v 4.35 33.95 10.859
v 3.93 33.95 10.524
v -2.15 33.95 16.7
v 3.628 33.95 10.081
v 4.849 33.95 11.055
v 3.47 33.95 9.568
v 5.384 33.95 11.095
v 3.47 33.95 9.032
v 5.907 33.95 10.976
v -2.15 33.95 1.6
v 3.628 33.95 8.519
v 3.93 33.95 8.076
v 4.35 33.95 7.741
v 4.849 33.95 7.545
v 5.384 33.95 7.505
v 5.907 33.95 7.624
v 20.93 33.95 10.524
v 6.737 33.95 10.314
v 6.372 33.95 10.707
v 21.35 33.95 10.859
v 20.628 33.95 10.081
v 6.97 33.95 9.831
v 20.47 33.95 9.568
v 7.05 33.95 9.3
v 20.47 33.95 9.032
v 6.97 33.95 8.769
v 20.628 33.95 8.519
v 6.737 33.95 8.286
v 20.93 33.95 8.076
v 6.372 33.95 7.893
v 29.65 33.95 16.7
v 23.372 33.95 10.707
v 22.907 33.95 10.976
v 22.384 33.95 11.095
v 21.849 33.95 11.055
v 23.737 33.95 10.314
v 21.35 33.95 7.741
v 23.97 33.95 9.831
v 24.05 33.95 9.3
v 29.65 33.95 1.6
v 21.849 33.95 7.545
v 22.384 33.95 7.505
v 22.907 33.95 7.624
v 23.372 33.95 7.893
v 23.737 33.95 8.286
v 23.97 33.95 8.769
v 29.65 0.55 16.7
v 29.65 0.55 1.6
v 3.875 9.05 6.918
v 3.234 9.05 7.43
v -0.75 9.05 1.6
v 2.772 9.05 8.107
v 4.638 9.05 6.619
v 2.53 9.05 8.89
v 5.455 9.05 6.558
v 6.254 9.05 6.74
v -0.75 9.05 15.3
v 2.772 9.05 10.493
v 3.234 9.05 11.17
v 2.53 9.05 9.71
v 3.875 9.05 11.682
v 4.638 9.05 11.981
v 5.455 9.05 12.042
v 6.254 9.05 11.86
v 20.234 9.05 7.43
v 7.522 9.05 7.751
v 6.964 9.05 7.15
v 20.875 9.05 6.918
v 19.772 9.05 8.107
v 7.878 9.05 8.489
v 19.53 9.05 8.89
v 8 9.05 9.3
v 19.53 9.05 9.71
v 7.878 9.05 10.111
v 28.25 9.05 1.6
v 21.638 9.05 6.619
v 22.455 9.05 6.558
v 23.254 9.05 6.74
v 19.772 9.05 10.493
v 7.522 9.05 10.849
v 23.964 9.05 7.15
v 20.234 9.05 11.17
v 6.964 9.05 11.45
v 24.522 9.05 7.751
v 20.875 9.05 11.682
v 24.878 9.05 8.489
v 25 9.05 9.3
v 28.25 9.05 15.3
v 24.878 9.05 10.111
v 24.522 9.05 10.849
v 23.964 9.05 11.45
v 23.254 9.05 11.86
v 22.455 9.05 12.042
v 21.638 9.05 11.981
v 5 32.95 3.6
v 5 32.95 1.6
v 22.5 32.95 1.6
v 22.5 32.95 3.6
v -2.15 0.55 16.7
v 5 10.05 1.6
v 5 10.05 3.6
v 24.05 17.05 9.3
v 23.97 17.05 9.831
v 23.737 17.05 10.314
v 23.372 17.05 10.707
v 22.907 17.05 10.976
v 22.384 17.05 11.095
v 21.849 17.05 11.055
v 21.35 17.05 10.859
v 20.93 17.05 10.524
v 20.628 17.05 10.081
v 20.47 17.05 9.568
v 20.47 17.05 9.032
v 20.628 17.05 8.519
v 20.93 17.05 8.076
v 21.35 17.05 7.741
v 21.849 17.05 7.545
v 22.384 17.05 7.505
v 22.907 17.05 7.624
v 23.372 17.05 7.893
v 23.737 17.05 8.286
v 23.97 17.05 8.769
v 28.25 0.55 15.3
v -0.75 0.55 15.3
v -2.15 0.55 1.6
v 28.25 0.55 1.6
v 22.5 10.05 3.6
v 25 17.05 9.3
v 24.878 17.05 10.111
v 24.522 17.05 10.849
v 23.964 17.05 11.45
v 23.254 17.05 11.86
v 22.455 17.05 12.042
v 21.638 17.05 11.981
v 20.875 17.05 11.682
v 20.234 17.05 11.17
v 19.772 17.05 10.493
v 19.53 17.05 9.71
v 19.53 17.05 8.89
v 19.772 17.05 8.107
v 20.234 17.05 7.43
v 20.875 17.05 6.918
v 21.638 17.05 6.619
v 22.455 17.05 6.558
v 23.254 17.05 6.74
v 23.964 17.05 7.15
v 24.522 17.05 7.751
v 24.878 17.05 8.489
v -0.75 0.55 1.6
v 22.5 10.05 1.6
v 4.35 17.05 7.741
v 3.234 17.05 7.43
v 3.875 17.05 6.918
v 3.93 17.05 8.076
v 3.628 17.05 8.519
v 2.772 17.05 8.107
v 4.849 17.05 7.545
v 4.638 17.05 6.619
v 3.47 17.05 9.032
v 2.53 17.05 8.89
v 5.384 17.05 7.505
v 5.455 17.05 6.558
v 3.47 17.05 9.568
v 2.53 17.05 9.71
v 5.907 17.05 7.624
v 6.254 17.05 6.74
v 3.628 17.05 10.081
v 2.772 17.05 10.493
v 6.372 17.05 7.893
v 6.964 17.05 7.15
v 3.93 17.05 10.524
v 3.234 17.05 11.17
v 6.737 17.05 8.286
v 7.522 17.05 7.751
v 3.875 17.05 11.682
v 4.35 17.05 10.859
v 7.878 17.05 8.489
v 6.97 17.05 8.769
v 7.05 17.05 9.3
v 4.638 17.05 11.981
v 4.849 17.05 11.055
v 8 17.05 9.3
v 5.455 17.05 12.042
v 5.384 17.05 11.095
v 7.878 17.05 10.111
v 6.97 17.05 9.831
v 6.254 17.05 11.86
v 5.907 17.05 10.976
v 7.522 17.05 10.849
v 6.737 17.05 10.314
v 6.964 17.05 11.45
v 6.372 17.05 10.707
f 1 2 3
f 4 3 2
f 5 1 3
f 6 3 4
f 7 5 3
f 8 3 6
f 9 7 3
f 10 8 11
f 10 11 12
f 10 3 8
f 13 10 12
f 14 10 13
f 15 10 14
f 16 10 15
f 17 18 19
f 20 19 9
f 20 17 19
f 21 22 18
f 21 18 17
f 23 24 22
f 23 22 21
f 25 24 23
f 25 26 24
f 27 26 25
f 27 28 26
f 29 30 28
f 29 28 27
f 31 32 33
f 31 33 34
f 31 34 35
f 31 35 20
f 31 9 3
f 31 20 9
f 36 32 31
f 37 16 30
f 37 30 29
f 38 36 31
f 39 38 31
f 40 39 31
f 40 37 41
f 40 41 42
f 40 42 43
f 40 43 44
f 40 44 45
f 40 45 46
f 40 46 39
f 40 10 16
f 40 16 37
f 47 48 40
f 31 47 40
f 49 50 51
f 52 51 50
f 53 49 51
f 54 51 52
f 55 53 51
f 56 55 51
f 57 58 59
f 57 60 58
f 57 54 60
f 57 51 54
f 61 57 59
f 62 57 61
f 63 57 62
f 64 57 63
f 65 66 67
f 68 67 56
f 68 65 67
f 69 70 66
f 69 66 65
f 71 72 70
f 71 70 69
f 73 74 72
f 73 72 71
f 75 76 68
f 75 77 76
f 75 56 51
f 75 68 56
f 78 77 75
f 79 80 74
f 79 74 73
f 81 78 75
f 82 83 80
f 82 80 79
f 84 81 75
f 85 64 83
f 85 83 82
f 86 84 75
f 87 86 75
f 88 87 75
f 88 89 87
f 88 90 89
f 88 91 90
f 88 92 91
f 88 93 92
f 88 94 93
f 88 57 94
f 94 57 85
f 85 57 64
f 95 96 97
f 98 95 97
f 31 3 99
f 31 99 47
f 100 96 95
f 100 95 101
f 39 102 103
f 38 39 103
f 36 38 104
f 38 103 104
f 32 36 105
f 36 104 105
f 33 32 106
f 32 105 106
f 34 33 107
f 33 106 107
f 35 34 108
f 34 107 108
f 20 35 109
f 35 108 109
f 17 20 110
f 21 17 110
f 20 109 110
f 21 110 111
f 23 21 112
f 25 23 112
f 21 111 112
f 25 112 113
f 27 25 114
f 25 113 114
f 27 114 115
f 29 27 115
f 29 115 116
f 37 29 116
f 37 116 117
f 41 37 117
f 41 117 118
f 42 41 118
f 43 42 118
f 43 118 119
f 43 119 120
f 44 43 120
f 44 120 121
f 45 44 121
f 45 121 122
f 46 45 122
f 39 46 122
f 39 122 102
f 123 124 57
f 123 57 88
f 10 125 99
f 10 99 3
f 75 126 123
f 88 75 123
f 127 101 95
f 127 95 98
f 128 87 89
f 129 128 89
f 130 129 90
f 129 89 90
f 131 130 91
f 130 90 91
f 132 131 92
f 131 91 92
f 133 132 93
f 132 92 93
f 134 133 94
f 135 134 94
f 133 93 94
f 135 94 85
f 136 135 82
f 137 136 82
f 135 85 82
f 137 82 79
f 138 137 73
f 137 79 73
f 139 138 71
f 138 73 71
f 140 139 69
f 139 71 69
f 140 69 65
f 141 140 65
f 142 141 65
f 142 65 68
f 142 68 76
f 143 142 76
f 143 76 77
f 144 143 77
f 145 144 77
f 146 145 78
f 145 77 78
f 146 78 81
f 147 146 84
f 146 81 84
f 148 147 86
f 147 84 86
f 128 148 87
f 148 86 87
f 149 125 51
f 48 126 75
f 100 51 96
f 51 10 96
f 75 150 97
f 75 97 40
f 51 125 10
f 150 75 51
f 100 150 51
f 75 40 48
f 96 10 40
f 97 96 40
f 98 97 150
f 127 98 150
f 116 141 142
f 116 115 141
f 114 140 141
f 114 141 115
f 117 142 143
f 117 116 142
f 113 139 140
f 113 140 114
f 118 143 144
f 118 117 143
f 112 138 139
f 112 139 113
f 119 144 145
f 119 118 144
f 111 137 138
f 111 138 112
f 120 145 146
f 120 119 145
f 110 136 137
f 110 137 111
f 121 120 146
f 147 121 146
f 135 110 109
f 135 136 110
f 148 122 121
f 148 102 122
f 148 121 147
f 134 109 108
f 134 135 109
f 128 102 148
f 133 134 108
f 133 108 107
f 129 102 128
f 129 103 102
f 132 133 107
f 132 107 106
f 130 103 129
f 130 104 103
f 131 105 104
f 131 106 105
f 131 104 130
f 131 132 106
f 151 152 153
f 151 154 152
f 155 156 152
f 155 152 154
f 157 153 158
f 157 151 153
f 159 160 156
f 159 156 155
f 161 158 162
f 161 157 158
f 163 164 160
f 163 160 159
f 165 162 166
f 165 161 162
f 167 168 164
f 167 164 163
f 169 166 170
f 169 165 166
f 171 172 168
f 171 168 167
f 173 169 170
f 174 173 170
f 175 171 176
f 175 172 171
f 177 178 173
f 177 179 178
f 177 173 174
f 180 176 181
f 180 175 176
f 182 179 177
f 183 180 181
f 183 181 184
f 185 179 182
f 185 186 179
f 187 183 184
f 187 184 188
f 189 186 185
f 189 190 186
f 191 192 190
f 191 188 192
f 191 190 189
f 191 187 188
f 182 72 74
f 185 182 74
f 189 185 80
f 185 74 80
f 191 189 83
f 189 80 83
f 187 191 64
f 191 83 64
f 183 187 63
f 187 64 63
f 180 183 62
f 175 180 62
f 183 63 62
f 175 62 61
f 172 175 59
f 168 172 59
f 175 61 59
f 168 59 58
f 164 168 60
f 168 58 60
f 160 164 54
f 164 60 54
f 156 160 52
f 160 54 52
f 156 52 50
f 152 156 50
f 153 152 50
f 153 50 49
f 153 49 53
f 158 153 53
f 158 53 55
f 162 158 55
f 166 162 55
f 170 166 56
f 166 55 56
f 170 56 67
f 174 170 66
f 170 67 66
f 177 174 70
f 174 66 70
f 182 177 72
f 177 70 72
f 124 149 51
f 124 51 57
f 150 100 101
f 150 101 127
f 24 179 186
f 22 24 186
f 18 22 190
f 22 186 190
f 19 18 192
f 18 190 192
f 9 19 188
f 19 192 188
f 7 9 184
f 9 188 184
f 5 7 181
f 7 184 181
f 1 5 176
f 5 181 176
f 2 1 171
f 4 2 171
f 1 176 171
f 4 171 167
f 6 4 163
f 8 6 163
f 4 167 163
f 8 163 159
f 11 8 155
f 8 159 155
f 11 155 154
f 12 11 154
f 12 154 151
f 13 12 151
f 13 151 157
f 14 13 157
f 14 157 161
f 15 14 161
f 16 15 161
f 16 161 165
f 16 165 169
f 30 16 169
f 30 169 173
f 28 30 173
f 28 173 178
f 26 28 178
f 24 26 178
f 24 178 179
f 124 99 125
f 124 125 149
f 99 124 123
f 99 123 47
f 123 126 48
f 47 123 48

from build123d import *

# Parameters (mm, degrees)
SKETCH004_W     = 31.8
SKETCH004_H     = 33.4
PAD002_DEPTH    = 15.1
SKETCH005_W     = 29.000001
SKETCH005_H     = 13.7
POCKET001_DEPTH = 8.5
SKETCH006_W     = 17.5
SKETCH006_H     = 22.9
POCKET002_DEPTH = 2
SKETCH009_R     = 2.75
POCKET004_DEPTH = 8
SKETCH010_R     = 1.8
POCKET005_DEPTH = 20


with BuildPart() as part:
    # Sketch004 (on Face5 of Binder001) → Pad002 (new body)
    with BuildSketch(Plane.XY.offset(1.6)):
        with Locations((13.749781, 17.25)):
            Rectangle(SKETCH004_W, SKETCH004_H)
    extrude(amount=PAD002_DEPTH)

    # Sketch005 (on Face2 of Pad002) → Pocket001 (cut)
    with BuildSketch(Plane.XZ.offset(-0.55)):
        with Locations((13.74978, 8.45)):
            Rectangle(SKETCH005_W, SKETCH005_H)
    extrude(amount=-POCKET001_DEPTH, mode=Mode.SUBTRACT)

    # Sketch006 (on Face4 of Pocket001) → Pocket002 (cut)
    with BuildSketch(Plane(origin=(0, 0, 1.6), x_dir=(1, 0, 0), z_dir=(0, 0, -1))):
        with Locations((13.75, -21.5)):
            Rectangle(SKETCH006_W, SKETCH006_H)
    extrude(amount=-POCKET002_DEPTH, mode=Mode.SUBTRACT)

    # Sketch009 (on Face10 of Pocket002) → Pocket004 (cut)
    with BuildSketch(Plane.XZ.offset(-9.05)):
        with Locations((5.24978, 9.3)):
            Circle(SKETCH009_R)
        with Locations((22.249781, 9.3)):
            Circle(SKETCH009_R)
    extrude(amount=-POCKET004_DEPTH, mode=Mode.SUBTRACT)

    # Sketch010 (on Face18 of Pocket004) → Pocket005 (cut)
    with BuildSketch(Plane.XZ.offset(-17.05)):
        with Locations((5.24978, 9.3)):
            Circle(SKETCH010_R)
        with Locations((22.249781, 9.3)):
            Circle(SKETCH010_R)
    extrude(amount=-POCKET005_DEPTH, mode=Mode.SUBTRACT)


solid = part.part
